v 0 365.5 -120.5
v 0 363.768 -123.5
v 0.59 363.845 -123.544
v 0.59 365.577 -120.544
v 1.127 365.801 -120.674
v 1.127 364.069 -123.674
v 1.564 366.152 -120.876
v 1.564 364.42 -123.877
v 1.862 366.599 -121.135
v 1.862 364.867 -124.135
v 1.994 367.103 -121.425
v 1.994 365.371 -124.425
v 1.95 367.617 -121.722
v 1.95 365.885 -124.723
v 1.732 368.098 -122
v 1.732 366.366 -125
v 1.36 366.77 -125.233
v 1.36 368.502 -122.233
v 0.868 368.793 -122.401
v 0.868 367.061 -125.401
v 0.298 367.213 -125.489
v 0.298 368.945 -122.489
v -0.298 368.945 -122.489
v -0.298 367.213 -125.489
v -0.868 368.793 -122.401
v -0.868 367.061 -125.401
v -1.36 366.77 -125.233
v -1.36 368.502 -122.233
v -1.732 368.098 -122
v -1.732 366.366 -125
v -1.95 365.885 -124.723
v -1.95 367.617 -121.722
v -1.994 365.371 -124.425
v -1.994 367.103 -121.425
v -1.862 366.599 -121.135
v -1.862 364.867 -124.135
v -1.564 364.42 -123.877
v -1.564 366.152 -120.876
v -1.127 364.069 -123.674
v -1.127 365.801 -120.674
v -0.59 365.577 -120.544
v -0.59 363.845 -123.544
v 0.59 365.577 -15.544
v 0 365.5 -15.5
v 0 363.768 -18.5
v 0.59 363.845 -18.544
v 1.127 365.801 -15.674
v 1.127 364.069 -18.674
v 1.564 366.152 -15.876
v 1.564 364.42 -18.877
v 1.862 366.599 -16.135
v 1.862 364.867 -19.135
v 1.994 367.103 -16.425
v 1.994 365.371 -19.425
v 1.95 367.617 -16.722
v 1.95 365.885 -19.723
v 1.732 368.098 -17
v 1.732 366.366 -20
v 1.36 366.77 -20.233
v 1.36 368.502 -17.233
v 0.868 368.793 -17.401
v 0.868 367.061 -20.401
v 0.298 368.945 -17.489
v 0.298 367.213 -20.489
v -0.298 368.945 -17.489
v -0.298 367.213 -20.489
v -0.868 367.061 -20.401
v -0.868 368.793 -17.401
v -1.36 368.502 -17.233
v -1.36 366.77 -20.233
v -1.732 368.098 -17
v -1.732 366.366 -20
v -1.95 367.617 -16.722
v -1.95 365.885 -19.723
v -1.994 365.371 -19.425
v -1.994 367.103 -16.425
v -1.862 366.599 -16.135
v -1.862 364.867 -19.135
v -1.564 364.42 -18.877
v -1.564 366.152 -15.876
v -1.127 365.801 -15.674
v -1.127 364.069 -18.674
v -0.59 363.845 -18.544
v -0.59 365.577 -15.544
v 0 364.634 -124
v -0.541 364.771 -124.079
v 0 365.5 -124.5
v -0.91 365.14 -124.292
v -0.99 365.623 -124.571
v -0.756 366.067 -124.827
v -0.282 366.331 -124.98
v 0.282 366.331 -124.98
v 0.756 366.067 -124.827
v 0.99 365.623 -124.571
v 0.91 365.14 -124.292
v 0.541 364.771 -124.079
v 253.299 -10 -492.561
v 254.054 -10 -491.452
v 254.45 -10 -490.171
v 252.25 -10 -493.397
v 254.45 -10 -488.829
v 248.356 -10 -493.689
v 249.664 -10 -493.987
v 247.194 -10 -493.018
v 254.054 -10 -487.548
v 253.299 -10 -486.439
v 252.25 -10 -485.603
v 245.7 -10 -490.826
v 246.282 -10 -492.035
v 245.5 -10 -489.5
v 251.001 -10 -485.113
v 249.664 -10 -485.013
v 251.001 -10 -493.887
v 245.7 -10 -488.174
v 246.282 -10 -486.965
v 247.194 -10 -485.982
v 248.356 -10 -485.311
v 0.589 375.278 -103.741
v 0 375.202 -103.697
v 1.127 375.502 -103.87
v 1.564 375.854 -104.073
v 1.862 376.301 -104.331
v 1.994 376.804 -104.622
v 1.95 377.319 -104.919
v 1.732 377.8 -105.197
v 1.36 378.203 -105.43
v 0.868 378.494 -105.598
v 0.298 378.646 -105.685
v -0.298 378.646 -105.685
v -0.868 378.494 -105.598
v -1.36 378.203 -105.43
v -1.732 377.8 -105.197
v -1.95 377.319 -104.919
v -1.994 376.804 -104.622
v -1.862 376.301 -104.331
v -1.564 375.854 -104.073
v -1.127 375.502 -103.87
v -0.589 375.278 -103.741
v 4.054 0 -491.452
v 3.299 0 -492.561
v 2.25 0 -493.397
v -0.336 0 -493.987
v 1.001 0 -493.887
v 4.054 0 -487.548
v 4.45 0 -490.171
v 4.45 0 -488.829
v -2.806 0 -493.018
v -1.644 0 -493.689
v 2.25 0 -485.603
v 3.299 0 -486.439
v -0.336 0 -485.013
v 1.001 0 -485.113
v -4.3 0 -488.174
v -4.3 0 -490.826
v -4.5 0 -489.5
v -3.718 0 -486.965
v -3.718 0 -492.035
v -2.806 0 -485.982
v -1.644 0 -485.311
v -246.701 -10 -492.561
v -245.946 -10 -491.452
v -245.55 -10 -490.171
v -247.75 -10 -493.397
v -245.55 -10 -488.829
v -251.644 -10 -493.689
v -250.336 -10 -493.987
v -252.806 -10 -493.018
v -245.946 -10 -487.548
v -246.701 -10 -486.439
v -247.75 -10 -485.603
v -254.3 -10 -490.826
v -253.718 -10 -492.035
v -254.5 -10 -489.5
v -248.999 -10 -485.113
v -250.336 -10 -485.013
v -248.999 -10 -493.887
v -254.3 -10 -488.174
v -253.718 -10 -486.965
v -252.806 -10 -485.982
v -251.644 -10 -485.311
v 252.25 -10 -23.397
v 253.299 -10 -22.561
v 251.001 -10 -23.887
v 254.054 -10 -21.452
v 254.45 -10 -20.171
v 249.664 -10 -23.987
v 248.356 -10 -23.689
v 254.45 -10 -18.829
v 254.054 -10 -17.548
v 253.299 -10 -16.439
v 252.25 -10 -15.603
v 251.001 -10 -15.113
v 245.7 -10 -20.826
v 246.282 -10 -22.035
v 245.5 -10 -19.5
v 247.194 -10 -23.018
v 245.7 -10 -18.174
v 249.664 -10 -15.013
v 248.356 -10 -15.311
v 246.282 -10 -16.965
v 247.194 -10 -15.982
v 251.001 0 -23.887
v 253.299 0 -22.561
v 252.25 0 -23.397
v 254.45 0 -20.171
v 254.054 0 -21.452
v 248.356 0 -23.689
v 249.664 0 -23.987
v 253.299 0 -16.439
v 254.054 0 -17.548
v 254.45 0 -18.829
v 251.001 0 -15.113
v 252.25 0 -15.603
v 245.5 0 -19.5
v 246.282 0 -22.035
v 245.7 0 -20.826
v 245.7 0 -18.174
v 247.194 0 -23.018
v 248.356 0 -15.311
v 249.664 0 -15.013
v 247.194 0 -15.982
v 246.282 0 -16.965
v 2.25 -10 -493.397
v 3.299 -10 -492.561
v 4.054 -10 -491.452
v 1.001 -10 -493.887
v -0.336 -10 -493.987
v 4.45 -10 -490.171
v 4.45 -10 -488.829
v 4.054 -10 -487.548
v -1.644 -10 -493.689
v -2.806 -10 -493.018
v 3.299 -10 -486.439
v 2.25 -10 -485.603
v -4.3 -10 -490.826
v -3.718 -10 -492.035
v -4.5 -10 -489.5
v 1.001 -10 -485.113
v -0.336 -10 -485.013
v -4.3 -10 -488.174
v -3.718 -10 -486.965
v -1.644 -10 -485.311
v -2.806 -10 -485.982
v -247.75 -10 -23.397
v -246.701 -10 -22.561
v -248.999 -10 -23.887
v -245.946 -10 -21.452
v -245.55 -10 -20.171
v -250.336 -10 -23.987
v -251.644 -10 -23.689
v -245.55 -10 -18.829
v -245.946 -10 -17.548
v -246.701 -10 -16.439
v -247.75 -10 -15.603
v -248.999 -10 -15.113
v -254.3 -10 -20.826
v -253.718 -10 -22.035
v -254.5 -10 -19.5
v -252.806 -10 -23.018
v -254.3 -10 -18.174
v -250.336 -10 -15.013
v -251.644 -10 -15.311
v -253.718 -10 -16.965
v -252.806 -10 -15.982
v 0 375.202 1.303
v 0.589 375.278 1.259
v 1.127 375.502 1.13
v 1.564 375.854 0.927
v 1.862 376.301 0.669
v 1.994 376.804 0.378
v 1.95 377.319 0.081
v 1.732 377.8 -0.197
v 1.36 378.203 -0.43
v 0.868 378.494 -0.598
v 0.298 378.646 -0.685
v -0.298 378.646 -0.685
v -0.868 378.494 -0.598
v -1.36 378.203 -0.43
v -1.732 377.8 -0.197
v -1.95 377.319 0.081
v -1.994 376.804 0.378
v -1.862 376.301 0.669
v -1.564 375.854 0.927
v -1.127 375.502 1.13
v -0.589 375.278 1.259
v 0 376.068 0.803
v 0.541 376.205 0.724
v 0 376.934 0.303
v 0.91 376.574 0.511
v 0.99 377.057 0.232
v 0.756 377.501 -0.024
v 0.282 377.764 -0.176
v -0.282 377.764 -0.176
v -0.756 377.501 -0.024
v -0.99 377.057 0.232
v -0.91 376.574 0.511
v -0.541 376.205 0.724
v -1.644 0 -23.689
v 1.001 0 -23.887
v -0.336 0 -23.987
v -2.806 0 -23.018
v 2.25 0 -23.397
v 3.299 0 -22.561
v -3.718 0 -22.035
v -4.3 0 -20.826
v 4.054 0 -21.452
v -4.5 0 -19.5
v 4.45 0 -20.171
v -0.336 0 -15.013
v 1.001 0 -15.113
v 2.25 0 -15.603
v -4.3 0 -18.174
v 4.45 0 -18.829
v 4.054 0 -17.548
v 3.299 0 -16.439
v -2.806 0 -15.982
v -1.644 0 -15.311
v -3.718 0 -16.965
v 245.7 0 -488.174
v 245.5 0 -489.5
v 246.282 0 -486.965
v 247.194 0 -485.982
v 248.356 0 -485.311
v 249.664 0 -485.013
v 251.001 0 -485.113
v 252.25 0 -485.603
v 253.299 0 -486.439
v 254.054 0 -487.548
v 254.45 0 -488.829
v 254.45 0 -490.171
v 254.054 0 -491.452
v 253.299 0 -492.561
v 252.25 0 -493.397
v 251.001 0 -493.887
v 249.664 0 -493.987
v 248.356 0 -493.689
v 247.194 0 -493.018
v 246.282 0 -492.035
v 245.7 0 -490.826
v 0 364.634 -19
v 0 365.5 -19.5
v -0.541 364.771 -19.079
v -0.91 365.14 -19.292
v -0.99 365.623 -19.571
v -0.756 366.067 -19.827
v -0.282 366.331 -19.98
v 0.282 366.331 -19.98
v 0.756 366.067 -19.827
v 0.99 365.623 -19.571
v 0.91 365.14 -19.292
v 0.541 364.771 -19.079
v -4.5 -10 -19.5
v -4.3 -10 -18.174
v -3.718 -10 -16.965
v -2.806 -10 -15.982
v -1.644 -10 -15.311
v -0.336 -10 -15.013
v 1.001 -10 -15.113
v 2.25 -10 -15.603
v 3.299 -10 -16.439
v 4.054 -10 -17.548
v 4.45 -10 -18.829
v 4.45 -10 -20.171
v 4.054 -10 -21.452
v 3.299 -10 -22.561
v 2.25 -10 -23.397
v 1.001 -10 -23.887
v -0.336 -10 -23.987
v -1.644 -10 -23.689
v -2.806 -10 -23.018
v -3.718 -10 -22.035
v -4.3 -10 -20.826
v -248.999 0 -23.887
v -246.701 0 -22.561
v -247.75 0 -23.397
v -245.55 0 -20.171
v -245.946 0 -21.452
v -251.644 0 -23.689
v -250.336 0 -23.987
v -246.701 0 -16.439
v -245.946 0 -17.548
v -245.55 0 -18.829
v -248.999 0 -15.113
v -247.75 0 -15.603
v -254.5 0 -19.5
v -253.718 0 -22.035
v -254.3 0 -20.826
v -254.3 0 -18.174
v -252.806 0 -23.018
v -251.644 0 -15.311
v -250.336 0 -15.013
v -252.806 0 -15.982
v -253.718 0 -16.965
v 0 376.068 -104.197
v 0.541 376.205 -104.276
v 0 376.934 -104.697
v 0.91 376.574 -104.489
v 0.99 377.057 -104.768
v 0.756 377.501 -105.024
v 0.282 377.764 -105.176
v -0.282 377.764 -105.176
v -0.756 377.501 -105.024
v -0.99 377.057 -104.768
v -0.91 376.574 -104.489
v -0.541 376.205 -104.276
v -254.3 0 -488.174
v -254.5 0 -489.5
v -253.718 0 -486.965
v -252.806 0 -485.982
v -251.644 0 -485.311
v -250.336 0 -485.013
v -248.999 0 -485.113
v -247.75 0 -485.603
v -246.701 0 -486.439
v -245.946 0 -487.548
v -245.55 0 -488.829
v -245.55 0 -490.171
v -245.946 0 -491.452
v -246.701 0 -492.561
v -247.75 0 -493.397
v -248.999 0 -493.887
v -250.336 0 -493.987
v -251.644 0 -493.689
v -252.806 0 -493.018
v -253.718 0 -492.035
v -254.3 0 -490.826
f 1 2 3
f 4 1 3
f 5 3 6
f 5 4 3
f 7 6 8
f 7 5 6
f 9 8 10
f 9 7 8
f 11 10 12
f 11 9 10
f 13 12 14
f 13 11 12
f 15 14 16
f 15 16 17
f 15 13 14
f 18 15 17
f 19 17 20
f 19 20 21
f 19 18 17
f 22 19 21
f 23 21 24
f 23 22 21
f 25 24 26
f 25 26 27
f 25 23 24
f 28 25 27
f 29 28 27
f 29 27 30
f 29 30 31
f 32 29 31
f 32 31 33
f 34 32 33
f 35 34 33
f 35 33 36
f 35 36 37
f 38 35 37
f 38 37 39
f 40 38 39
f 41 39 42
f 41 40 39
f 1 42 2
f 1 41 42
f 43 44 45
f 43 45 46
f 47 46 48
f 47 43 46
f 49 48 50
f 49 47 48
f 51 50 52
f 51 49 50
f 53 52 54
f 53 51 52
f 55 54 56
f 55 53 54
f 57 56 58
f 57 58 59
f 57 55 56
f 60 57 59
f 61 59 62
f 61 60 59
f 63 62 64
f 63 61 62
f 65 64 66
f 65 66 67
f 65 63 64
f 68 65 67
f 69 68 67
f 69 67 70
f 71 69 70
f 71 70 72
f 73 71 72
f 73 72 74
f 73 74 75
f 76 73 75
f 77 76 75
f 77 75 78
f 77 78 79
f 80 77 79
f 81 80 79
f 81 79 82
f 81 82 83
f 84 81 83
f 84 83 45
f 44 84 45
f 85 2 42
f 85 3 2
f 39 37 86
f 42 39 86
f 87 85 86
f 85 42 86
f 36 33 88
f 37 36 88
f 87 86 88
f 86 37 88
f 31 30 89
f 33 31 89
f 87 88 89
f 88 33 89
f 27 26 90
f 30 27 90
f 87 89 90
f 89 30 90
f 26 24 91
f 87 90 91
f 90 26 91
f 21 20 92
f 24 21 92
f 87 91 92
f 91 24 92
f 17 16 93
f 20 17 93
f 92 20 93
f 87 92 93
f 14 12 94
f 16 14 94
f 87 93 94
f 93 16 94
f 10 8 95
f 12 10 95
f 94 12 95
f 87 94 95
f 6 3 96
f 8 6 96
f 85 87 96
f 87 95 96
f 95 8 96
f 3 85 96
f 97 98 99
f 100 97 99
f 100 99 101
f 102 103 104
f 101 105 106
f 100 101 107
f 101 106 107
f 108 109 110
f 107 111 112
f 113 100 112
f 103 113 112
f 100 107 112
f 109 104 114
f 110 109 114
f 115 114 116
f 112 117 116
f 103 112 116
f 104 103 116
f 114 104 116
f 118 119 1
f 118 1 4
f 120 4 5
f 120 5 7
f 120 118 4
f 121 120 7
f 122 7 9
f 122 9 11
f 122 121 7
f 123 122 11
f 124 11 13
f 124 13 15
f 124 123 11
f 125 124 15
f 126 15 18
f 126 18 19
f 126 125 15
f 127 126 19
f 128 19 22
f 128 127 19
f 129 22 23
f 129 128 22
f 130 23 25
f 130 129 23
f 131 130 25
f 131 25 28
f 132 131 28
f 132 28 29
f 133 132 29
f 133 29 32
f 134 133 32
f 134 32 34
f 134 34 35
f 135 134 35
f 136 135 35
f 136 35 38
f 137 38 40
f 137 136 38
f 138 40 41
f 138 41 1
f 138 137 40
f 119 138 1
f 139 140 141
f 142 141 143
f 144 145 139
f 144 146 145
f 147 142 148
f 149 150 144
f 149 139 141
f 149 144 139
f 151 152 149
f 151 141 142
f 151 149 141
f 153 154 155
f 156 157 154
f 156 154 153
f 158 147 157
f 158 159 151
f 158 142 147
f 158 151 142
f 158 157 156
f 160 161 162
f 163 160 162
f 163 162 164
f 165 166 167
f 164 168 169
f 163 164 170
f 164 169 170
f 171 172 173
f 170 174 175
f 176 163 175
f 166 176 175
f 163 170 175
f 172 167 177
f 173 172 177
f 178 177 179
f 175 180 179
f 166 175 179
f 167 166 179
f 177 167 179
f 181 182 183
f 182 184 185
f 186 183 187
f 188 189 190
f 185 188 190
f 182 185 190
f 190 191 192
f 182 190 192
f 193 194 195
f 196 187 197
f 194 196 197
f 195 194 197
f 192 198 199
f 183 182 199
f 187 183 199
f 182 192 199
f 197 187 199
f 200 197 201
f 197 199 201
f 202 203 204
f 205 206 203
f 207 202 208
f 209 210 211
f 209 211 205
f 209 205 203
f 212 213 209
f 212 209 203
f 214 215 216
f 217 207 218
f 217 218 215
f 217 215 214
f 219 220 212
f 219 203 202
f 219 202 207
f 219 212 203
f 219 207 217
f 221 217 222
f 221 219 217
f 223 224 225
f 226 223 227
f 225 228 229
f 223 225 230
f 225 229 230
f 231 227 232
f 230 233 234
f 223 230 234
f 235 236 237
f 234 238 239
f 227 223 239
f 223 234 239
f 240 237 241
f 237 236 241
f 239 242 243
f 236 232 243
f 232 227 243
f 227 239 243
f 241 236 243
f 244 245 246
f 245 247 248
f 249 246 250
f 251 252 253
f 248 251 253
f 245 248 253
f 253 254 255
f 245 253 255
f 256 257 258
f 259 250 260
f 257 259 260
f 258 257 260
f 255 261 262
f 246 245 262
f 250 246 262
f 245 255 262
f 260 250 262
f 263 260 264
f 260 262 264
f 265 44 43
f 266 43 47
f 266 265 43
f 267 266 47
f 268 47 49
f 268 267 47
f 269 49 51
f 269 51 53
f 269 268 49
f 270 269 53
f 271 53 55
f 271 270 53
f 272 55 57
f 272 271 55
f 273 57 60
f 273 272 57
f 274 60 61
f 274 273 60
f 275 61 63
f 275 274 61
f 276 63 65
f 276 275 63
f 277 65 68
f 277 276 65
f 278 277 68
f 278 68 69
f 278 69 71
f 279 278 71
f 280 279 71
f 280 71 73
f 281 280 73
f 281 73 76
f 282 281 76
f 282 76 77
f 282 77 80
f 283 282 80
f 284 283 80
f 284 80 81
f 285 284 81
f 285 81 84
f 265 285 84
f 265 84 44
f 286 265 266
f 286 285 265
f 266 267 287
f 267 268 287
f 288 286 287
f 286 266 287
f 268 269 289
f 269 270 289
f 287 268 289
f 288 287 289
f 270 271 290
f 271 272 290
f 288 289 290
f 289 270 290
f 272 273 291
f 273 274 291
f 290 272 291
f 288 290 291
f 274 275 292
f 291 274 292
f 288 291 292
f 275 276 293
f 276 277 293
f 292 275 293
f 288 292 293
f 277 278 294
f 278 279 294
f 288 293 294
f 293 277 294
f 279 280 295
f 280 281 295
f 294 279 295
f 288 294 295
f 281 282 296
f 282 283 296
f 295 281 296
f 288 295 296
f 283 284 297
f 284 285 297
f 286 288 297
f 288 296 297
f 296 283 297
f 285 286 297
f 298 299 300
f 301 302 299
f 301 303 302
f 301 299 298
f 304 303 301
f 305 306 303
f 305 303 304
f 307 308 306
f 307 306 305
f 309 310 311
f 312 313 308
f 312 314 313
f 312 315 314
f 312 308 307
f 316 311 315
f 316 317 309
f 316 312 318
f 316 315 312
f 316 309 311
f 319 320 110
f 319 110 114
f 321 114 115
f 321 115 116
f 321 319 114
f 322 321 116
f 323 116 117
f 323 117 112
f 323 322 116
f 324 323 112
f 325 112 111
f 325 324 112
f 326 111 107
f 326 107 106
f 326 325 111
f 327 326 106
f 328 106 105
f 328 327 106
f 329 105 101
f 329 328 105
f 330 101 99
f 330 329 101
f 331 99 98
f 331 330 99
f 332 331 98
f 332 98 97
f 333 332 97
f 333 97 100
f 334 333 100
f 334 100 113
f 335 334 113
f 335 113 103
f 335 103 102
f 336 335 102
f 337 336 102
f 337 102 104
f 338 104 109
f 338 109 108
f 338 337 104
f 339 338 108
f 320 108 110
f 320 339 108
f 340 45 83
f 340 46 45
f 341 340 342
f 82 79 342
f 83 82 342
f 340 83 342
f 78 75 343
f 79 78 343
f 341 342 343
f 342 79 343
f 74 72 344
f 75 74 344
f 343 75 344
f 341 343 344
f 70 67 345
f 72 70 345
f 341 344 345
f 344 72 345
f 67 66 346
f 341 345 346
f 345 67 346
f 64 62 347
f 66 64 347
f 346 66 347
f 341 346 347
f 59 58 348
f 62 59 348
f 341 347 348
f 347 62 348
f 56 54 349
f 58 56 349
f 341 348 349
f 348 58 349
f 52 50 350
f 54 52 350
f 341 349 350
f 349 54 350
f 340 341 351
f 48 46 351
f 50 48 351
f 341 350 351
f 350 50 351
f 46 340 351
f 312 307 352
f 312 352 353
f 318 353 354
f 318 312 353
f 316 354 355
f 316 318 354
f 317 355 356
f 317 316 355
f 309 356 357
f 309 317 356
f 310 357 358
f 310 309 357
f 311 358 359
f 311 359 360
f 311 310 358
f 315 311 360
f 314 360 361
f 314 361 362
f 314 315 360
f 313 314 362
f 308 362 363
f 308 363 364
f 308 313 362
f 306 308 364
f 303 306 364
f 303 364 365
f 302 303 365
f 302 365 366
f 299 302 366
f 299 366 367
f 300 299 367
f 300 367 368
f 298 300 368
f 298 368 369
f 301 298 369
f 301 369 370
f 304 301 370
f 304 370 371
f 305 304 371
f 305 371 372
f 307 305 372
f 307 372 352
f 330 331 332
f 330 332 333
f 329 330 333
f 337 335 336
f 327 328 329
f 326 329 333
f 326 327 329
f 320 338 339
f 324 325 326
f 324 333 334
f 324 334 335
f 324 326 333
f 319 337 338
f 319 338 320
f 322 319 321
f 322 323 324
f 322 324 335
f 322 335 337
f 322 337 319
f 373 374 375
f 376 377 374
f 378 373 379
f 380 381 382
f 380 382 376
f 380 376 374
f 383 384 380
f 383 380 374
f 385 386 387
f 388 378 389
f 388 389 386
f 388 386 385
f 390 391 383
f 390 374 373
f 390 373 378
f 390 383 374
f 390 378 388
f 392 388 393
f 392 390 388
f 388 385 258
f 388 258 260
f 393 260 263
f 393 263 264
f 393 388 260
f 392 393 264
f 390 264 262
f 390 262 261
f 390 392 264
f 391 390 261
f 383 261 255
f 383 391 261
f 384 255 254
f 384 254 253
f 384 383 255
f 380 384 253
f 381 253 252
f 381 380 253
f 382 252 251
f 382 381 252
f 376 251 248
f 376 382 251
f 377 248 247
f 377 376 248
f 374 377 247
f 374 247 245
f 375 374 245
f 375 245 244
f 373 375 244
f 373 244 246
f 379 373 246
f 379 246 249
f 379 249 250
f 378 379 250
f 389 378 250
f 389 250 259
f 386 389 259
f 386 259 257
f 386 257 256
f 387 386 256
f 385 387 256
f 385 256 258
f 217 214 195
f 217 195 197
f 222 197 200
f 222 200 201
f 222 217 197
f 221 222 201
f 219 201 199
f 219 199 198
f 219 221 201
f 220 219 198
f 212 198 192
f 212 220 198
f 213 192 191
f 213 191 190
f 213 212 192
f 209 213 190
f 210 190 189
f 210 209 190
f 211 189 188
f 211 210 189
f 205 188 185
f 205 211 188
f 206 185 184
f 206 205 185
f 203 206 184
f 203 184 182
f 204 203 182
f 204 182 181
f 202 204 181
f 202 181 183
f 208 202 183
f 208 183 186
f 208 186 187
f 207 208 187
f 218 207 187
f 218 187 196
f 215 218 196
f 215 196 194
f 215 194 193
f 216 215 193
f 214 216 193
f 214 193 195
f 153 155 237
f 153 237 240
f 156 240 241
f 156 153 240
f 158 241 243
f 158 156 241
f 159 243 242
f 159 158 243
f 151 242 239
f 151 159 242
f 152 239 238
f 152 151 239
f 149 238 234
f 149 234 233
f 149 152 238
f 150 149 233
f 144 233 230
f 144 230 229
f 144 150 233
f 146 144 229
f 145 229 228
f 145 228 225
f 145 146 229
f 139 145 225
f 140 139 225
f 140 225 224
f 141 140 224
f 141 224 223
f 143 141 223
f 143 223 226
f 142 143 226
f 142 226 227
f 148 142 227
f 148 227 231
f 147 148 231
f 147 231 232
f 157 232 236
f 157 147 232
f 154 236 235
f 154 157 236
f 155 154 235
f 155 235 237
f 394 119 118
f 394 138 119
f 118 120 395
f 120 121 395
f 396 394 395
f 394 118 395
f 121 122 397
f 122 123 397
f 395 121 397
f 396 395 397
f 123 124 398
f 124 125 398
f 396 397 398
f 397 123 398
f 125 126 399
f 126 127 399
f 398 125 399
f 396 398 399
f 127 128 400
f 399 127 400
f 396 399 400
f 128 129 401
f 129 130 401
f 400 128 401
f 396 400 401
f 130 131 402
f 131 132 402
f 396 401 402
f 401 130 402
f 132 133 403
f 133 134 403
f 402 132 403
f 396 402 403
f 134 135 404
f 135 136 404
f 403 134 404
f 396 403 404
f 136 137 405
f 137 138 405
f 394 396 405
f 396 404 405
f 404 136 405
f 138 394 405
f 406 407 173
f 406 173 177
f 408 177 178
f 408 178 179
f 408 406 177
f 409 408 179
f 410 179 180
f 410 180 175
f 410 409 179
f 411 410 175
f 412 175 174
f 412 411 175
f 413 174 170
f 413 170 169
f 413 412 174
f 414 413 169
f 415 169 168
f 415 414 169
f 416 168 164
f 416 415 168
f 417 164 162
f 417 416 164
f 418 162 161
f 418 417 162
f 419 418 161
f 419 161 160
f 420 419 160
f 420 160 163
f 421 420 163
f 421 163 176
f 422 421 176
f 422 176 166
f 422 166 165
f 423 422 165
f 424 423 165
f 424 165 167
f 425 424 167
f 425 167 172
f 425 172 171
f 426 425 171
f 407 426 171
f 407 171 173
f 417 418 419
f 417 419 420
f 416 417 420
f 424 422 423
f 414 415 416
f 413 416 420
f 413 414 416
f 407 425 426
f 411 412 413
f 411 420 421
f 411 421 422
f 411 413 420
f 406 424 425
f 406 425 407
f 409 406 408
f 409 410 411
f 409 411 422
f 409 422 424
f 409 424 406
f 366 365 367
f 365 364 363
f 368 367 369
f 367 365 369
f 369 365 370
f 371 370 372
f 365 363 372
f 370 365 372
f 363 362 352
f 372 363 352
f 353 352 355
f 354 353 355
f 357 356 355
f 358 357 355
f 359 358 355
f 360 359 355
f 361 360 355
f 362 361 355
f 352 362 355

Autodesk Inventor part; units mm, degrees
ref_plane "YZ Plane" through (0, 0, 0) normal (1, 0, 0) x (0, 1, 0)
ref_plane "XY Plane" through (0, 0, 0) normal (0, 0, 1) x (1, 0, 0)
sketch "S-Orientierung" plane through (0, 0, 0) normal (0, 1, 0) x (-1, 0, 0)
  line L0 (290.75, 0) -> (-290.75, 0)
  line L1 (-290.75, 0) -> (-290.75, -564.4)
  line L2 (-290.75, -564.4) -> (290.75, -564.4)
  line L3 (290.75, -564.4) -> (290.75, 0)
  line L4 (0, -718.1) -> (0, 161.1) construction
  line L5 (-448, 0) -> (448, 0) construction
  line L6 (320, 35.5) -> (-320, 35.5)
  line L7 (-320, 35.5) -> (-320, -592.5)
  line L8 (-320, -592.5) -> (320, -592.5)
  line L9 (320, -592.5) -> (320, 35.5)
  point P0 (0, 0)
  point P1 (0, -19.5)
  point P2 (0, -124.5)
  dimension "d2" = 640
  dimension "d3" = 628
  dimension "d4" = 35.5
  dimension "d67" = 55
  dimension "d87" = 29.25
  dimension "d88" = 28.1
  dimension "d89" = 564.4
  dimension "d90" = 581.5
  dimension "d105" = 160
surface extrude "Ex-Innenseiten-4040-Profile" sketch "S-Orientierung" along normal mid plane 40 shown no curves L6 L7 L8 L9
ref_plane "Deckenebene" through (0, 365.5, 0) normal (0, 1, 0) x (-1, 0, 0)
sketch "HF-Anschlusspunkte" plane through (0, 0, 0) normal (0, 1, 0) x (-1, 0, 0)
  line L0 (40, -12) -> (-40, -12)
  line L1 (-40, -12) -> (-40, -93.7)
  line L2 (-40, -93.7) -> (40, -93.7)
  line L3 (40, -93.7) -> (40, -12)
  line L4 (-25, -12) -> (-25, -93.7) construction
  line L5 (25, -93.7) -> (25, -12) construction
  circle A0 centre (0, -19.5) radius 4.5
  line L6 (320, 35.5) -> (-320, 35.5) construction
  line L7 (0, -718.1) -> (0, 161.1) projected
  line L8 (40, -482) -> (-40, -482)
  line L9 (-40, -482) -> (-40, -563.7)
  line L10 (-40, -563.7) -> (40, -563.7)
  line L11 (40, -563.7) -> (40, -482)
  line L12 (-25, -482) -> (-25, -563.7) construction
  line L13 (25, -563.7) -> (25, -482) construction
  circle A1 centre (0, -489.5) radius 4.5
  line L14 (-320, -592.5) -> (320, -592.5) projected
  line L15 (296.8699, -564.4) -> (-360.8589, -564.4) construction
  line L16 (-290.75, -592.5) -> (-290.75, 35.5) construction
  line L17 (-320, 35.5) -> (-320, -592.5) construction
  line L18 (-210, -482) -> (-290, -482)
  circle A2 centre (-250, -489.5) radius 4.5
  line L19 (-275, -482) -> (-275, -563.7) construction
  line L20 (-290, -482) -> (-290, -563.7)
  line L21 (-210, -563.7) -> (-210, -482)
  line L22 (-290, -563.7) -> (-210, -563.7)
  line L23 (-225, -563.7) -> (-225, -482) construction
  line L24 (-225, -93.7) -> (-225, -12) construction
  line L25 (-210, -93.7) -> (-210, -12)
  line L26 (-210, -12) -> (-290, -12)
  line L27 (-290, -93.7) -> (-210, -93.7)
  circle A3 centre (-250, -19.5) radius 4.5
  line L28 (-275, -12) -> (-275, -93.7) construction
  line L29 (-290, -12) -> (-290, -93.7)
  line L30 (210, -482) -> (290, -482)
  circle A4 centre (250, -489.5) radius 4.5
  line L31 (275, -482) -> (275, -563.7) construction
  line L32 (290, -482) -> (290, -563.7)
  line L33 (210, -563.7) -> (210, -482)
  line L34 (290, -563.7) -> (210, -563.7)
  line L35 (225, -563.7) -> (225, -482) construction
  line L36 (225, -93.7) -> (225, -12) construction
  line L37 (210, -93.7) -> (210, -12)
  line L38 (210, -12) -> (290, -12)
  line L39 (290, -93.7) -> (210, -93.7)
  circle A5 centre (250, -19.5) radius 4.5
  line L40 (275, -12) -> (275, -93.7) construction
  line L41 (290, -12) -> (290, -93.7)
  line L42 (290.75, -592.5) -> (290.75, 35.5) construction
  point P0 (0, 0)
  point P1 (0, -93.7)
  point P2 (0, -470)
  point P3 (0, -563.7)
  point P4 (-250, -470)
  point P5 (-250, -563.7)
  point P6 (-250, -93.7)
  point P7 (-250, 0)
  point P8 (250, -470)
  point P9 (250, -563.7)
  point P10 (250, -93.7)
  point P11 (250, 0)
  point P12 (40, -522.85)
  point P13 (40, -52.85)
  point P14 (-250, -482)
  dimension "d68" = 80
  dimension "d69" = 81.7
  dimension "d70" = 15
  dimension "d71" = 15
  dimension "d72" = 40
  dimension "d73" = 7.5
  dimension "d74" = 9
  dimension "d75" = 47.5
  dimension "d79" = 470
  dimension "d84" = 28.8
  dimension "d85" = 28.1
  dimension "d86" = 29.25
  dimension "d93" = 250
  dimension "d98" = 470
  dimension "d99" = 500
  dimension "d109" = 55
ref_plane "KnickHöhe-HF-Kabel" through (0, 109, 0) normal (0, 1, 0) x (-1, 0, 0)
extrude "Ex-HF-Probeanschlüsse" add sketch "HF-Anschlusspunkte" against normal blind 10 contours L7 A0 | A0 L7 | A1 L7 | L7 A1 | A2 | A3 | A4 | A5
sketch "S-HF-Kabeleinlass" plane through (0, 0, 0) normal (1, 0, 0) x (0, 1, 0)
  line L0 (-75.3867, -19.5) -> (452.3202, -19.5) projected
  line L1 (365.5, 100.2641) -> (365.5, -592.4607) projected
  line L2 (365.5, -19.5) -> (365.5, -19.5) construction
  line L3 (365.5, -19.5) -> (376.9335, 0.3034)
  line L4 (365.5, -19.5) -> (363.7679, -18.5)
  line L5 (363.7679, -18.5) -> (375.2015, 1.3034)
  line L6 (375.2015, 1.3034) -> (376.9335, 0.3034)
  point P0 (0, 0)
  dimension "d102" = 30
  dimension "d104" = 2
revolve "Um-HF-Kabeleinlass" add sketch "S-HF-Kabeleinlass" angle 360 about axis through (0, 365.5, -19.5) along (0, 0.5, 0.8660254) separate body
sketch "S-KabelKnickPunkte" plane through (0, 109, 0) normal (0, 1, 0) x (-1, 0, 0)
  circle A0 centre (0, -19.5) radius 4.5 projected
  circle A1 centre (-250, -19.5) radius 4.5 projected
  circle A2 centre (-250, -489.5) radius 4.5 projected
  circle A3 centre (0, -489.5) radius 4.5 projected
  circle A4 centre (250, -489.5) radius 4.5 projected
  circle A5 centre (250, -19.5) radius 4.5 projected
pattern_linear "Rechteckige Anordnung3" count 2 spacing 105 along (0, 0, -1) bodies 2
equation "\"d71\" = d70"
properties part number "HF-Kabelführung-V3-XGantry-LängenSkizze"
